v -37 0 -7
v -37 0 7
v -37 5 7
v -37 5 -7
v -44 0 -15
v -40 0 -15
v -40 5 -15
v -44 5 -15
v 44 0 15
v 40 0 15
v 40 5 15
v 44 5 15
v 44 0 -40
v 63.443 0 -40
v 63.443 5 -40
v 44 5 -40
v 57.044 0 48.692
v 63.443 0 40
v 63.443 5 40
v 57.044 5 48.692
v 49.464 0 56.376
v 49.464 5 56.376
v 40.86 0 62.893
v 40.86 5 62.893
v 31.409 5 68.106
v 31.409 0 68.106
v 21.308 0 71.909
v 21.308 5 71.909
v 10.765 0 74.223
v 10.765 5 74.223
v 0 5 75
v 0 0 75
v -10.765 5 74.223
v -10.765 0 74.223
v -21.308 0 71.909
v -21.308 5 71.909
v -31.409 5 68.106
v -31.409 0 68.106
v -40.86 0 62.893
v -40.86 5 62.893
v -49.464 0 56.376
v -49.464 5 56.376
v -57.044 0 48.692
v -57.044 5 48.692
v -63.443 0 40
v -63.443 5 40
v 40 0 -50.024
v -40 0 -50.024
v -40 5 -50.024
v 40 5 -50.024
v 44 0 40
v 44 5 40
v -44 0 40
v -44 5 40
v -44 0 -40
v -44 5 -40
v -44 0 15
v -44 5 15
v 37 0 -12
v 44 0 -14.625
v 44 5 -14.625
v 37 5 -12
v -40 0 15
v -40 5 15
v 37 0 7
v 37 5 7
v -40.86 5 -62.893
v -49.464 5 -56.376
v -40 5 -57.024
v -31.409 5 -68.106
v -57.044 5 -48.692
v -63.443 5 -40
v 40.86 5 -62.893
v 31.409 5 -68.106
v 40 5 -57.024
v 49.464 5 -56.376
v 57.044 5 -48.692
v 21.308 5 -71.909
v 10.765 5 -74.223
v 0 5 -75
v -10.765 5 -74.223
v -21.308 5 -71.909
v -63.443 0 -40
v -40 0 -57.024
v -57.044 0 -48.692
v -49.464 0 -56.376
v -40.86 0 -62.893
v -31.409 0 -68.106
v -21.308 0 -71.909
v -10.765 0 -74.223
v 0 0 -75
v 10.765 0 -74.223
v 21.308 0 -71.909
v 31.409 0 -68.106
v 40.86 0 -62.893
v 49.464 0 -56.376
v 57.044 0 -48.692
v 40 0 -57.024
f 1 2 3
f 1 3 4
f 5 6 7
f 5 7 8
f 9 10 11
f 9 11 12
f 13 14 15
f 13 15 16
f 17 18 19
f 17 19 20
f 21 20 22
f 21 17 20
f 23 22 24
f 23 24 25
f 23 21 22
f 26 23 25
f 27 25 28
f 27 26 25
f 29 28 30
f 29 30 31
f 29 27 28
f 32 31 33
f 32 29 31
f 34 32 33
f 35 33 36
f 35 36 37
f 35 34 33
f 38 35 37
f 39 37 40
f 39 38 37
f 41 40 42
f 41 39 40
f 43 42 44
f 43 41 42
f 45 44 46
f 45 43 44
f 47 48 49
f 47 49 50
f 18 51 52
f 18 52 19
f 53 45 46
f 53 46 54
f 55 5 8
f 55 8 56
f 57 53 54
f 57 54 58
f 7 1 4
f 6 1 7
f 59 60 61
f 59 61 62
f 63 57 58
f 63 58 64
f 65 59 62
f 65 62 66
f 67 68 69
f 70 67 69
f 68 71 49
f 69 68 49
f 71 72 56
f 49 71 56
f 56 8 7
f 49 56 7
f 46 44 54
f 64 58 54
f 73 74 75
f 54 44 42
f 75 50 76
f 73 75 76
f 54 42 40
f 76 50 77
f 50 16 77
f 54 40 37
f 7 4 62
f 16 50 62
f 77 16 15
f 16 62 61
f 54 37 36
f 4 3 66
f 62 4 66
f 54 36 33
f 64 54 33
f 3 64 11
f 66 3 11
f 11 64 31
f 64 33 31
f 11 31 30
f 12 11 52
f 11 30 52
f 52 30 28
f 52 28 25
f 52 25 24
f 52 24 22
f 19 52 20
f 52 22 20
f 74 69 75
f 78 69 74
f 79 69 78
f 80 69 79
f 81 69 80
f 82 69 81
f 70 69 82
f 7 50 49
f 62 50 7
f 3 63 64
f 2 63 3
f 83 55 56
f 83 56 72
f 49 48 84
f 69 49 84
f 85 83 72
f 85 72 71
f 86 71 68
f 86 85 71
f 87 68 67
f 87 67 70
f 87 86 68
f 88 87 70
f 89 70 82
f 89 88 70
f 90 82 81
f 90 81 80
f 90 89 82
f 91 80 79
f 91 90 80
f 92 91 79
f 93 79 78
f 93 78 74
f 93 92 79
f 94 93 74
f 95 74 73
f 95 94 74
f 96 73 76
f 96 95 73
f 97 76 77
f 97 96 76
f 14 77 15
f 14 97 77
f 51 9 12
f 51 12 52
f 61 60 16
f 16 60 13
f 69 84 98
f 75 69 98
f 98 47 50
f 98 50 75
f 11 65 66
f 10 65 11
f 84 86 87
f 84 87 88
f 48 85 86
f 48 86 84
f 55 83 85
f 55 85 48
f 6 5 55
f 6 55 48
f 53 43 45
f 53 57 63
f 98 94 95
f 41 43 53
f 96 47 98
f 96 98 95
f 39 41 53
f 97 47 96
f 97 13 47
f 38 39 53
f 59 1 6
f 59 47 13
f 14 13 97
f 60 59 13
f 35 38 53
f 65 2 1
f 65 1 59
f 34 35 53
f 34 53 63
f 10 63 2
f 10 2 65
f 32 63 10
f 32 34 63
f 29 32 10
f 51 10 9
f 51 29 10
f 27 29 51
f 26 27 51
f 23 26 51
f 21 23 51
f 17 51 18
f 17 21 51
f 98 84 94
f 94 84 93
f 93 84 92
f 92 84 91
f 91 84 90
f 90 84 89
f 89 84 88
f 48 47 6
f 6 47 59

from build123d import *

# Parameters (mm, degrees)
SKETCH1_W           = 80
SKETCH1_H           = 7
BOSS_EXTRUDE1_DEPTH = 5
CHAMFER1_SIZE       = 8
CHAMFER1_SIZE_2     = 3


with BuildPart() as part:
    # Sketch1 → Boss-Extrude1 (new body)
    with BuildSketch(Plane(origin=(0, 0, 0), x_dir=(1, 0, 0), z_dir=(0, 1, 0))):
        with BuildLine():
            Line((-44, -40), (-44, -15))
            Line((-44, -15), (-37, -15))
            Line((-37, -15), (-37, 15))
            Line((-37, 15), (-44, 15))
            Line((-44, 15), (-44, 40))
            Line((-44, 40), (-63.442887702, 40))
            ThreePointArc((-63.442887702, 40), (0, 75), (63.442887702, 40))
            Line((63.442887702, 40), (44, 40))
            Line((44, 40), (44, 15))
            Line((44, 15), (37, 15))
            Line((37, 15), (37, -15))
            Line((37, -15), (44, -15))
            Line((44, -15), (44, -40))
            Line((44, -40), (63.442887702, -40))
            ThreePointArc((63.442887702, -40), (0, -75), (-63.442887702, -40))
            Line((-63.442887702, -40), (-44, -40))
        make_face()
        with Locations((0, 53.524444958)):
            Rectangle(SKETCH1_W, SKETCH1_H, mode=Mode.SUBTRACT)
    extrude(amount=BOSS_EXTRUDE1_DEPTH)

    # Chamfer1
    # the kernel refuses this chamfer: 8, 3 mm, written as the material it adds along each edge
    with BuildSketch(Plane(origin=(37, 0, 15), x_dir=(-0.013536660009854304, 0, -0.9999083752203387), z_dir=(0, 1, 0)), Plane(origin=(-37, 0, -15), x_dir=(0.013536660009854304, 0, 0.9999083752203387), z_dir=(0, 1, 0))) as chamfer1_piece_1:
        Polygon((CHAMFER1_SIZE * 0.99990837522, -CHAMFER1_SIZE * 0.0135366600099), (-CHAMFER1_SIZE_2 * 0.0135366600099, -CHAMFER1_SIZE_2 * 0.99990837522), (0, 0), align=None)
    extrude(amount=5)
    with BuildSketch(Plane(origin=(37, 0, -15), x_dir=(0.9999083752203387, 0, -0.013536660009854514), z_dir=(0, 1, 0))) as chamfer1_piece_2_section:
        Polygon((CHAMFER1_SIZE * 0.99990837522, -CHAMFER1_SIZE * 0.0135366600099), (-CHAMFER1_SIZE_2 * 0.0135366600099, -CHAMFER1_SIZE_2 * 0.99990837522), (0, 0), align=None)
    chamfer1_piece_2 = extrude(amount=5, mode=Mode.PRIVATE)
    chamfer1_piece_2 = split(chamfer1_piece_2, bisect_by=Plane(origin=(44, 2.5, -14.03968053), z_dir=(-1, 0, 0)), keep=Keep.TOP, mode=Mode.PRIVATE)
    add(chamfer1_piece_2)
    with BuildSketch(Plane(origin=(-37, 0, 15), x_dir=(-0.9953980532473654, 0, 0.09582648689874379), z_dir=(0, 1, 0))) as chamfer1_piece_3:
        Polygon((CHAMFER1_SIZE_2 * 0.995398053247, -CHAMFER1_SIZE_2 * 0.0958264868987), (-CHAMFER1_SIZE * 0.0958264868987, -CHAMFER1_SIZE * 0.995398053247), (0, 0), align=None)
    extrude(amount=5)


solid = part.part
